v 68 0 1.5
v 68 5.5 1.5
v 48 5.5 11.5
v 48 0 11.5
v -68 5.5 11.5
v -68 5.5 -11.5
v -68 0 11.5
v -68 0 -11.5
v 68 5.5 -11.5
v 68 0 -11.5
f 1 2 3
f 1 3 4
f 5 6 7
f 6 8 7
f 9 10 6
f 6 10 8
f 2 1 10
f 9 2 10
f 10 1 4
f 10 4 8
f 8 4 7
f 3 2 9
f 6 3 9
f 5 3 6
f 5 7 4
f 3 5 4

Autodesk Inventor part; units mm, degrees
ref_plane "YZ Plane" through (0, 0, 0) normal (1, 0, 0) x (0, 1, 0)
ref_plane "XZ Plane" through (0, 0, 0) normal (0, 1, 0) x (-1, 0, 0)
ref_plane "XY Plane" through (0, 0, 0) normal (0, 0, 1) x (1, 0, 0)
sketch "スケッチ1" plane through (0, 0, 0) normal (0, 1, 0) x (-1, 0, 0)
  line L0 (-68, -11.5) -> (68, -11.5)
  line L1 (68, -11.5) -> (68, 11.5)
  line L2 (68, 11.5) -> (-68, 11.5)
  line L3 (-68, 11.5) -> (-68, -11.5)
  line L4 (-68, -11.5) -> (68, 11.5) construction
  line L5 (68, -11.5) -> (-68, 11.5) construction
  point P0 (0, 0)
  dimension "d0" = 136
  dimension "d1" = 23
extrude "押し出し1" add sketch "スケッチ1" along normal blind 5.5
chamfer "面取り1" distance 20 distance2 10 1 edges at (68, 2.75, 11.5) measured on face at (-22.6667, 3.6667, 11.5)
properties part number "stopper" material "木材 (カエデ材)"
